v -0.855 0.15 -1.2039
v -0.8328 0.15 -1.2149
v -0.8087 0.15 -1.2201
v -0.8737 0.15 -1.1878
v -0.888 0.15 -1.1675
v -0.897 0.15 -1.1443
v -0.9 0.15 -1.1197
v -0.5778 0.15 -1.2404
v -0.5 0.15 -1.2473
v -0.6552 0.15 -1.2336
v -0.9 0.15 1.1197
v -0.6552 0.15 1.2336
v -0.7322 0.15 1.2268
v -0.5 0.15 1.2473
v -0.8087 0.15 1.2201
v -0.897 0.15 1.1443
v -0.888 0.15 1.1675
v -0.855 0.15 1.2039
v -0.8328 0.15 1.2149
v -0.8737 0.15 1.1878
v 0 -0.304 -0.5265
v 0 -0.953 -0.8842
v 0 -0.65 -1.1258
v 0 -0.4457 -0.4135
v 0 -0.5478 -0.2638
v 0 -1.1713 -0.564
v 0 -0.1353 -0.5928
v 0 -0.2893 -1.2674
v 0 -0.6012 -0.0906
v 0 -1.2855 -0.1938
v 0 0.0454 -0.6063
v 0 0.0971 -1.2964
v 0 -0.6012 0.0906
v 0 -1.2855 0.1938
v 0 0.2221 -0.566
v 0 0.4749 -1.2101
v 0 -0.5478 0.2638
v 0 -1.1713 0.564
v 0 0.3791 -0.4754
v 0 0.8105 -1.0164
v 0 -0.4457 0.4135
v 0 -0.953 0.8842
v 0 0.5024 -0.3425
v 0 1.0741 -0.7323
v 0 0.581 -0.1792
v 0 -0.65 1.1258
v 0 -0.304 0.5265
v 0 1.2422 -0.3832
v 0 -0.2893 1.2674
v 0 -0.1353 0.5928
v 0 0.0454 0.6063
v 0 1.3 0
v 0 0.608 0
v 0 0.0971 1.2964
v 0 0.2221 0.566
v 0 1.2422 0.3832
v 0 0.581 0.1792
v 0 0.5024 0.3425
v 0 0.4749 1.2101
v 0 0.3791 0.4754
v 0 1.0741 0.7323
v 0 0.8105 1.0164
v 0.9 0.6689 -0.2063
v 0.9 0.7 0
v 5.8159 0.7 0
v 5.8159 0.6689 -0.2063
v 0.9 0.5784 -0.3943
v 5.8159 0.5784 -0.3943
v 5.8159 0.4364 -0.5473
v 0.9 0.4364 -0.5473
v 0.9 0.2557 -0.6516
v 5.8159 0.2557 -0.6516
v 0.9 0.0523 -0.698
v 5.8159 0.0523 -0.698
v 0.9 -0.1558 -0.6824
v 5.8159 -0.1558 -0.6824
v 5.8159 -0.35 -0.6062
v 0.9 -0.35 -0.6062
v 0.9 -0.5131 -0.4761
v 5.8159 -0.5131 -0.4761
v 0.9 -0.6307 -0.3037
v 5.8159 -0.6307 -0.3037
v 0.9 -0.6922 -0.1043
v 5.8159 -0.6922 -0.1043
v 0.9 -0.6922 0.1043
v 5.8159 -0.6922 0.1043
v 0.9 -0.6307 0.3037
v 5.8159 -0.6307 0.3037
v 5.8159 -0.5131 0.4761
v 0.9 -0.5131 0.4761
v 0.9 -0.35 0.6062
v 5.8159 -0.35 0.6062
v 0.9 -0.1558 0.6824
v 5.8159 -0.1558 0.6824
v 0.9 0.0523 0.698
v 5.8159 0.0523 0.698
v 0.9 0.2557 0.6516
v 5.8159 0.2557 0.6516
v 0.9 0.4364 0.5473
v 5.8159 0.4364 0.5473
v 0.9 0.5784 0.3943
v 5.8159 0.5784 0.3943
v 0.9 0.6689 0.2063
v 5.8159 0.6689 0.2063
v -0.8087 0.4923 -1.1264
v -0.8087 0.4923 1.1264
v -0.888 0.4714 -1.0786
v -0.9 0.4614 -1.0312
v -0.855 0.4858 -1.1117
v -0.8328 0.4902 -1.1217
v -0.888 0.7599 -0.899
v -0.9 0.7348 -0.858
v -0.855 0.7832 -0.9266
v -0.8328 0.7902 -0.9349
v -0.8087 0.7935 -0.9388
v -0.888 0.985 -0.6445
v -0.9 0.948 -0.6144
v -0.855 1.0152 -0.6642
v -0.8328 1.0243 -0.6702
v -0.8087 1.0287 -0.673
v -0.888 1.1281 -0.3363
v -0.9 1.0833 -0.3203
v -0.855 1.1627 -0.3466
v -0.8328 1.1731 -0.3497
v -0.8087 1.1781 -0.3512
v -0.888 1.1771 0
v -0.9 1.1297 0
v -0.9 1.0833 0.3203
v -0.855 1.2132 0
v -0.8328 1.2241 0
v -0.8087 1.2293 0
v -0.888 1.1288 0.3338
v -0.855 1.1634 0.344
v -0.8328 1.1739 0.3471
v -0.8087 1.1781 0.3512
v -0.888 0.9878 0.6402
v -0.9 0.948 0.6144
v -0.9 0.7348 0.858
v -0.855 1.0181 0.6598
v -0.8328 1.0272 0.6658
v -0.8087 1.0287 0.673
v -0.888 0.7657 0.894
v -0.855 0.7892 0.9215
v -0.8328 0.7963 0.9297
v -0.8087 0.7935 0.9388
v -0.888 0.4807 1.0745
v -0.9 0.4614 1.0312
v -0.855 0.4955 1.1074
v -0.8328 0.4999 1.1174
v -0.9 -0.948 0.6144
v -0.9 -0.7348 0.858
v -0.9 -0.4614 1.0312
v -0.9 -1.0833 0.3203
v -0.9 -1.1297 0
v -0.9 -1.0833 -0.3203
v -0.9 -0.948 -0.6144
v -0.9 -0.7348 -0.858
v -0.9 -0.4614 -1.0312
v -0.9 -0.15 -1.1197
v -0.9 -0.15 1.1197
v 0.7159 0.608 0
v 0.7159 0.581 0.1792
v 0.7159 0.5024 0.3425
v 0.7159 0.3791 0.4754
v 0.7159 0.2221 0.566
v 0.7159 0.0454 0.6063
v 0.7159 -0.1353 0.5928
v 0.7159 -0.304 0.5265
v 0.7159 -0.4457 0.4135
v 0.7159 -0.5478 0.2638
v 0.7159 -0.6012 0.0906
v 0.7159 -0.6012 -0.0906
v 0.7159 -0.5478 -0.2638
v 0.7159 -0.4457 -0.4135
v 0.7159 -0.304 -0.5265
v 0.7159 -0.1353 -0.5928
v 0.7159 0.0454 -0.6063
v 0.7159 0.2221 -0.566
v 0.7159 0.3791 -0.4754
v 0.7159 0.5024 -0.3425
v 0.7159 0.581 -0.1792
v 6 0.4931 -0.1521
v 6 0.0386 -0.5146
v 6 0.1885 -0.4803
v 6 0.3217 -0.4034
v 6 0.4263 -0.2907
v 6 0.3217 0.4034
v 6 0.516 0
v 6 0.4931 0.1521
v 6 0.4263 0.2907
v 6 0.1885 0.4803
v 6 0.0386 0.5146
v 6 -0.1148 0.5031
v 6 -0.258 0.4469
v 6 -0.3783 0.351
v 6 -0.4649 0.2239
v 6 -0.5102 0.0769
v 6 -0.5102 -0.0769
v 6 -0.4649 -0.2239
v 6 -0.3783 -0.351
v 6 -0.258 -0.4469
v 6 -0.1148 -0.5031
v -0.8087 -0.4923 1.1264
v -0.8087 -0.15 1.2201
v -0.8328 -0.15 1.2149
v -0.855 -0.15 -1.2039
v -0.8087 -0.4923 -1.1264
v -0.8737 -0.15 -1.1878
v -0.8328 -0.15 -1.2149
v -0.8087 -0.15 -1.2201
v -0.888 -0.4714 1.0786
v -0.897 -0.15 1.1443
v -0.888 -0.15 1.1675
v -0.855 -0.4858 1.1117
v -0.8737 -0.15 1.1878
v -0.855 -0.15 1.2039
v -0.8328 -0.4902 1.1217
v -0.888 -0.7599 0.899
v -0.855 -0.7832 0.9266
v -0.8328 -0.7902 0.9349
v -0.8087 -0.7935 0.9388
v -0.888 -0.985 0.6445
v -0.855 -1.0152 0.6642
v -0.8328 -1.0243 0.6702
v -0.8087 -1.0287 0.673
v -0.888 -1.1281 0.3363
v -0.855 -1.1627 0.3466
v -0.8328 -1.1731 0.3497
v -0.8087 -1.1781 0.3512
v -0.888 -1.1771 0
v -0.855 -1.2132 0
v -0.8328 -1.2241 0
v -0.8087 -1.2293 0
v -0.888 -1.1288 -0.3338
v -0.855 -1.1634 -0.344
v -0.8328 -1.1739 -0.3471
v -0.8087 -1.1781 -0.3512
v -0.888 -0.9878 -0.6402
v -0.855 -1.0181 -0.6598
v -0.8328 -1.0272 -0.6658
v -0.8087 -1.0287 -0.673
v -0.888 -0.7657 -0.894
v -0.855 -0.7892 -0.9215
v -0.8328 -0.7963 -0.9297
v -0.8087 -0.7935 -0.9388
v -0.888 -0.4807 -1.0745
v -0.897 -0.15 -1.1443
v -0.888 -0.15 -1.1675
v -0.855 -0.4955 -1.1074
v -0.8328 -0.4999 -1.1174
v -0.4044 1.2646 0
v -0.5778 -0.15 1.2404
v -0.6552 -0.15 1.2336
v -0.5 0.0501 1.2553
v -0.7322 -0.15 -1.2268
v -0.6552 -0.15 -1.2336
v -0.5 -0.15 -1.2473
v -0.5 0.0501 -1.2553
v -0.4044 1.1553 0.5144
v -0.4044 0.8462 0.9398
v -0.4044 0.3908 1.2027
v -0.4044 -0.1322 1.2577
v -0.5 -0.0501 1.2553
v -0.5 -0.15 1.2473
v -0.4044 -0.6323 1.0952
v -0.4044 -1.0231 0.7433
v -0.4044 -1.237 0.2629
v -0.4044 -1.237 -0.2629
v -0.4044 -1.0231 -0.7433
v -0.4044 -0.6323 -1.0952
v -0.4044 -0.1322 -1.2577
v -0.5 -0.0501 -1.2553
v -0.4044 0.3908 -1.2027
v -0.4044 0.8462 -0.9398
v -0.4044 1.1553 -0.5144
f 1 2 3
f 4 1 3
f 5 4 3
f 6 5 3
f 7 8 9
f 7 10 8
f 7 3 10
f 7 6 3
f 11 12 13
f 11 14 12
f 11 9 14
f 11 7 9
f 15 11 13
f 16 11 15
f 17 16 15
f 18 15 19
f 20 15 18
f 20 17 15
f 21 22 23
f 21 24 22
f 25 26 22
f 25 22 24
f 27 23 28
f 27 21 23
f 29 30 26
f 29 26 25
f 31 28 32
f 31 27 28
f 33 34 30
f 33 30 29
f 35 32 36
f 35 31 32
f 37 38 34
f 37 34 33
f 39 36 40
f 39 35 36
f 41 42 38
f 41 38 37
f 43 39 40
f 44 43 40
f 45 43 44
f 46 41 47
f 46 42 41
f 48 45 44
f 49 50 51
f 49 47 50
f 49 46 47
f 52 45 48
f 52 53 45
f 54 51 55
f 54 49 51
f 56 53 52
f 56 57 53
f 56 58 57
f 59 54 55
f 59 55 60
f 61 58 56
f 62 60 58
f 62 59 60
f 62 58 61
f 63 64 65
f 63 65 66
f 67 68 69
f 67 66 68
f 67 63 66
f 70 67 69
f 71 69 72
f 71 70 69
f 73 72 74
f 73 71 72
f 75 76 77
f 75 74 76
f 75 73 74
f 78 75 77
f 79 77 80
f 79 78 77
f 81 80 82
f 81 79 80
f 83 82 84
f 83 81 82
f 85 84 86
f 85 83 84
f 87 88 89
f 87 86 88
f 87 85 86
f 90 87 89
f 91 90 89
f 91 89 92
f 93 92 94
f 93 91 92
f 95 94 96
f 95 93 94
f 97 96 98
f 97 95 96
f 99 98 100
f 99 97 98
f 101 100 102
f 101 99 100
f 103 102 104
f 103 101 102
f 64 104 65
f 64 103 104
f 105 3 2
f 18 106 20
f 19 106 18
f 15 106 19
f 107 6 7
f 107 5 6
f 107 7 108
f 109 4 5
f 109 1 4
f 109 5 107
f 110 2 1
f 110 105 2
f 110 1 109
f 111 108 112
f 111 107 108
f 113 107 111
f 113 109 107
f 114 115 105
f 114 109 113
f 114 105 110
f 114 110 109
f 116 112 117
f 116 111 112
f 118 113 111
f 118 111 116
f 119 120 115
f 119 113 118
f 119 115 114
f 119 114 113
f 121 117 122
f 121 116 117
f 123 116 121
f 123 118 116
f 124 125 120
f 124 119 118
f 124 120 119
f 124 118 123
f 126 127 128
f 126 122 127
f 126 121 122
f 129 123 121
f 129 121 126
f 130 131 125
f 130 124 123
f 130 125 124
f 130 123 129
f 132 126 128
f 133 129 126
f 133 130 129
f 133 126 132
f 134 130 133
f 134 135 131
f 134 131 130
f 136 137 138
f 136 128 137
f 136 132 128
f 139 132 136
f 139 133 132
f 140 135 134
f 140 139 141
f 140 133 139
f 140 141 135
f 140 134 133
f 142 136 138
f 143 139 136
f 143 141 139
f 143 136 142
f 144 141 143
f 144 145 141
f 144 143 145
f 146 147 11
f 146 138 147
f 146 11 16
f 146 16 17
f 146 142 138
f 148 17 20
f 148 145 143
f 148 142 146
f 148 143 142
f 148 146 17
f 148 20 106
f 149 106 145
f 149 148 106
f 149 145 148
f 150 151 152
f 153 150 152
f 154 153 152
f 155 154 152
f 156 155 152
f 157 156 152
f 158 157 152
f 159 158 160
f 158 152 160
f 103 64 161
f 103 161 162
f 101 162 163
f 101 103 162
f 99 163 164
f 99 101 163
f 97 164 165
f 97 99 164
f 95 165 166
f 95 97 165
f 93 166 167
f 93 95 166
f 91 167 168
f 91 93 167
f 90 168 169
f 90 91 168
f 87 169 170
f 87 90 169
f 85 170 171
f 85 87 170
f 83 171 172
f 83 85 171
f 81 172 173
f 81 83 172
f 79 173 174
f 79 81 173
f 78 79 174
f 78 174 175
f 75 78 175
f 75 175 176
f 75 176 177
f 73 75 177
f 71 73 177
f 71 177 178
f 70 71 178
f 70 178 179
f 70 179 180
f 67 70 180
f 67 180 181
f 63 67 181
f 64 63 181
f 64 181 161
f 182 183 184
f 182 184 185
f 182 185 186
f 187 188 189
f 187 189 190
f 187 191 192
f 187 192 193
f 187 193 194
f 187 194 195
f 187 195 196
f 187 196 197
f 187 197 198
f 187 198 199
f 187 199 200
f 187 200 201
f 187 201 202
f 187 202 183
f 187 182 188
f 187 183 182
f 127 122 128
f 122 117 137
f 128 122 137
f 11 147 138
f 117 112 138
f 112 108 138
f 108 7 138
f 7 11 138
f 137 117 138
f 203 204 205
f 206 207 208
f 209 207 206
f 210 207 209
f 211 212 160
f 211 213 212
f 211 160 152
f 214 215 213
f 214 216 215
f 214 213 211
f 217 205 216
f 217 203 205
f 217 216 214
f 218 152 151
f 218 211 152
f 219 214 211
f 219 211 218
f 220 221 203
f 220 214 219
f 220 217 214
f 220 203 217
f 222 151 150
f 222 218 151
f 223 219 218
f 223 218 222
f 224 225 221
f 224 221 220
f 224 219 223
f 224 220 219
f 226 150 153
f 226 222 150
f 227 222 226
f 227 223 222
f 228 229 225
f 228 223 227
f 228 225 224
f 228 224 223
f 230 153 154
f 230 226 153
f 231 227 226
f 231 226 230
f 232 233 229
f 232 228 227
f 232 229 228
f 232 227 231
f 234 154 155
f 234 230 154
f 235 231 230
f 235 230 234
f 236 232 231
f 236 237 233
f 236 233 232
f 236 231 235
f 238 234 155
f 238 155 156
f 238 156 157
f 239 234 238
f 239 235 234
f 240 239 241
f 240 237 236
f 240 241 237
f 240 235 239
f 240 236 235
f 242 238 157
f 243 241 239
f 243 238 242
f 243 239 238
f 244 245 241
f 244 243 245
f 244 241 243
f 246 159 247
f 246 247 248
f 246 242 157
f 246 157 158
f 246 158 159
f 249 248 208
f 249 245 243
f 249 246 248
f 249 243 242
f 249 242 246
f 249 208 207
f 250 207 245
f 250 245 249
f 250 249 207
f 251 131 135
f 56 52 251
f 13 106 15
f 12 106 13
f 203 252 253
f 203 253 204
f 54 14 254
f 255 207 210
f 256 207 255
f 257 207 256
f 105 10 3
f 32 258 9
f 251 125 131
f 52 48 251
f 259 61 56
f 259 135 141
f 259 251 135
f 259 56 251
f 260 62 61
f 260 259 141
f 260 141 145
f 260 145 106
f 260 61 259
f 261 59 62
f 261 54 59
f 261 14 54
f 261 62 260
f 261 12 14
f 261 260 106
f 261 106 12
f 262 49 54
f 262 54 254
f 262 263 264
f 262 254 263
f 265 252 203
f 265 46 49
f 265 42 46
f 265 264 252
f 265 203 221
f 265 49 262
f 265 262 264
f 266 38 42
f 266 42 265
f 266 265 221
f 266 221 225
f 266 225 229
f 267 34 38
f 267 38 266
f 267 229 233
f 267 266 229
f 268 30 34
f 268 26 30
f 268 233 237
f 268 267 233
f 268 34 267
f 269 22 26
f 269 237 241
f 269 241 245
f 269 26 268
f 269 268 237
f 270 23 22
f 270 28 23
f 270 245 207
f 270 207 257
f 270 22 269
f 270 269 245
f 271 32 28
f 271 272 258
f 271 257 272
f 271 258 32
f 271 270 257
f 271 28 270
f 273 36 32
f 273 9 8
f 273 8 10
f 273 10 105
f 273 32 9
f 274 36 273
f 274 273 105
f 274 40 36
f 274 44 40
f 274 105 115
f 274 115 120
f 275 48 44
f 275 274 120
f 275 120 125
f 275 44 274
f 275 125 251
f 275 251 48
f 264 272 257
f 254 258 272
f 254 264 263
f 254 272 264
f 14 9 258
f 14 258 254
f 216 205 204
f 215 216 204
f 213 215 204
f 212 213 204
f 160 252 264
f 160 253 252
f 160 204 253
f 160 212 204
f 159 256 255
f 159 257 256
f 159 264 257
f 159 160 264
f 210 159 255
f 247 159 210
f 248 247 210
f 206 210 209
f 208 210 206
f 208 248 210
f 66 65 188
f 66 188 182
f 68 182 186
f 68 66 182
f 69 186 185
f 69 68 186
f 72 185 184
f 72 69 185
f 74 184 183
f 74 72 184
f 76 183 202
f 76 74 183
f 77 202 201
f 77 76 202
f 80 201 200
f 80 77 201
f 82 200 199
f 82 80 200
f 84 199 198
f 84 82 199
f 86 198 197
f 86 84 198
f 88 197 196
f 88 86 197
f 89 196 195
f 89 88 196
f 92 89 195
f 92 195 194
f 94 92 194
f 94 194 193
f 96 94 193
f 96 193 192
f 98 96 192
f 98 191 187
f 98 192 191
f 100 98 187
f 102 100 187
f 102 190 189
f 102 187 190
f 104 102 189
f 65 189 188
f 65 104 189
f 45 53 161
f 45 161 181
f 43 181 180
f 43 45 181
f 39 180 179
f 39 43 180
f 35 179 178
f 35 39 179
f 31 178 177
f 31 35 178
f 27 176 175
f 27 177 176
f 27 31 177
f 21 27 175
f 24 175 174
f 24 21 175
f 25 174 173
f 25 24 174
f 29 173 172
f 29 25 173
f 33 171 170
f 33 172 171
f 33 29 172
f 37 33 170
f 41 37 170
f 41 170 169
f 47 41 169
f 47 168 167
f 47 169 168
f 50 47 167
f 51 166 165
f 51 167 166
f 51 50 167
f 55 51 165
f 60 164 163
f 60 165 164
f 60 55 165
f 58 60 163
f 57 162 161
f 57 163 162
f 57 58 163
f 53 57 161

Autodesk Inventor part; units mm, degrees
ref_plane "YZ Plane" through (0, 0, 0) normal (1, 0, 0) x (0, 1, 0)
ref_plane "XZ Plane" through (0, 0, 0) normal (0, 1, 0) x (-1, 0, 0)
sketch "Sketch1" plane through (0, 0, 0) normal (0, 0, 1) x (1, 0, 0)
  line L0 (-0.9, 0) -> (6, 0)
  line L1 (6, 0) -> (6, 0.7)
  line L2 (6, 0.7) -> (0.9, 0.7)
  line L3 (0.9, 0.7) -> (0.7159, 0.608)
  line L4 (0.7159, 0.608) -> (0, 0.608)
  line L5 (0, 0.608) -> (0, 1.3)
  line L6 (-2.28, 0) -> (7.38, 0) projected
  line L7 (0, -0.26) -> (0, 1.56) projected
  line L8 (-0.9, 0) -> (-0.9, 1.2213)
  line L9 (0, 1.3) -> (-0.9, 1.2213)
  line L10 (0.9, 0.7) -> (0, 0.7) construction
  dimension "d0" = 6
  dimension "d1" = 5.1
  dimension "d2" = 0.1841
  dimension "d3" = 0.9
  dimension "d4" = 1.4
  dimension "d5" = 1.216
  dimension "d9" = 2.6
  dimension "d10" = 5
revolve "Body" add sketch "Sketch1" angle 360 about axis through (-0.9, 0, 0) along (1, 0, 0)
sketch "Sketch2" plane through (-0.9, 0, 0) normal (-1, 0, 0) x (0, 0, 1)
  circle A0 centre (0, 0) radius 1.3 projected
  line L0 (0, 0) -> (0, 1.2213) projected
  line L1 (-1.3, 0.15) -> (1.3, 0.15)
  line L2 (1.3, 0.15) -> (1.3, -0.15)
  line L3 (1.3, -0.15) -> (-1.3, -0.15)
  line L4 (-1.3, -0.15) -> (-1.3, 0.15)
  line L5 (-1.3, 0) -> (1.3, 0) construction
  line L6 (0, 0.15) -> (0, -0.15) construction
  dimension "d11" = 0.3
  dimension "d12" = 2.6
fillet "Fillet1" radius 0.1 1 edges at (-0.9, -1.2213, 0)
extrude "Slot" cut sketch "Sketch2" against normal blind 0.4 contours A0 L3 L1 | L2 L3 A0 | A0 L1 L2 | A0 L4 L1 | L3 L4 A0
thread "Thread" size "M1.4x0.3" class "6g" standard "ISO Metric profile" length 5.1
chamfer "Chamfer1" distance 0.184 distance2 0.1841 1 edges at (6, -0.7, 0) measured on face at (6, 0.4293, -0.1327)
ref_plane "Work Plane1" through (30.1625, 0, 0) normal (0, 0, -1) x (1, 0, 0)
equation "\"d11\" = SBR"
equation "\"d12\" = KOD"
equation "\"d19\" = STI"
equation "\"d14\" = RR"
equation "\"d15\" = GEL"
equation "\"d17\" = -0.5 * SPD + 0.5 * GD"
equation "\"d0\" = NLG"
equation "\"d1\" = GEL"
equation "\"d3\" = KOH"
equation "\"d4\" = GD"
equation "\"d5\" = BDM"
equation "\"d9\" = KOD"
equation "\"d10\" = KEWI"
equation "\"GD\" = NND"
equation "\"NLG\" = 6"
equation "\"GEL\" = 5.1"
equation "\"KOD\" = 2.6"
equation "\"KOH\" = 0.9"
equation "\"GAL\" = 0.61345 * PTC"
equation "\"SPD\" = NND - 1.2269 * PTC"
equation "\"BDM\" = 1.216"
equation "\"GUL\" = 0.61345 * PTC"
equation "\"RR\" = 0.1"
equation "\"SBR\" = 0.3"
equation "\"STI\" = 0.4"
equation "\"KEWI\" = 5deg"
equation "\"PTC\" = 0.3"
equation "\"THREADDIA\" = 1.4"
equation "\"TOA\" = 30deg"
equation "\"NND\" = 1.4"
equation "\"GD1\" = THREADDIA - 1.2269 * PTC"
properties part number "CNS 4355 - M 1,4 x 6" material "Steel, Mild"
